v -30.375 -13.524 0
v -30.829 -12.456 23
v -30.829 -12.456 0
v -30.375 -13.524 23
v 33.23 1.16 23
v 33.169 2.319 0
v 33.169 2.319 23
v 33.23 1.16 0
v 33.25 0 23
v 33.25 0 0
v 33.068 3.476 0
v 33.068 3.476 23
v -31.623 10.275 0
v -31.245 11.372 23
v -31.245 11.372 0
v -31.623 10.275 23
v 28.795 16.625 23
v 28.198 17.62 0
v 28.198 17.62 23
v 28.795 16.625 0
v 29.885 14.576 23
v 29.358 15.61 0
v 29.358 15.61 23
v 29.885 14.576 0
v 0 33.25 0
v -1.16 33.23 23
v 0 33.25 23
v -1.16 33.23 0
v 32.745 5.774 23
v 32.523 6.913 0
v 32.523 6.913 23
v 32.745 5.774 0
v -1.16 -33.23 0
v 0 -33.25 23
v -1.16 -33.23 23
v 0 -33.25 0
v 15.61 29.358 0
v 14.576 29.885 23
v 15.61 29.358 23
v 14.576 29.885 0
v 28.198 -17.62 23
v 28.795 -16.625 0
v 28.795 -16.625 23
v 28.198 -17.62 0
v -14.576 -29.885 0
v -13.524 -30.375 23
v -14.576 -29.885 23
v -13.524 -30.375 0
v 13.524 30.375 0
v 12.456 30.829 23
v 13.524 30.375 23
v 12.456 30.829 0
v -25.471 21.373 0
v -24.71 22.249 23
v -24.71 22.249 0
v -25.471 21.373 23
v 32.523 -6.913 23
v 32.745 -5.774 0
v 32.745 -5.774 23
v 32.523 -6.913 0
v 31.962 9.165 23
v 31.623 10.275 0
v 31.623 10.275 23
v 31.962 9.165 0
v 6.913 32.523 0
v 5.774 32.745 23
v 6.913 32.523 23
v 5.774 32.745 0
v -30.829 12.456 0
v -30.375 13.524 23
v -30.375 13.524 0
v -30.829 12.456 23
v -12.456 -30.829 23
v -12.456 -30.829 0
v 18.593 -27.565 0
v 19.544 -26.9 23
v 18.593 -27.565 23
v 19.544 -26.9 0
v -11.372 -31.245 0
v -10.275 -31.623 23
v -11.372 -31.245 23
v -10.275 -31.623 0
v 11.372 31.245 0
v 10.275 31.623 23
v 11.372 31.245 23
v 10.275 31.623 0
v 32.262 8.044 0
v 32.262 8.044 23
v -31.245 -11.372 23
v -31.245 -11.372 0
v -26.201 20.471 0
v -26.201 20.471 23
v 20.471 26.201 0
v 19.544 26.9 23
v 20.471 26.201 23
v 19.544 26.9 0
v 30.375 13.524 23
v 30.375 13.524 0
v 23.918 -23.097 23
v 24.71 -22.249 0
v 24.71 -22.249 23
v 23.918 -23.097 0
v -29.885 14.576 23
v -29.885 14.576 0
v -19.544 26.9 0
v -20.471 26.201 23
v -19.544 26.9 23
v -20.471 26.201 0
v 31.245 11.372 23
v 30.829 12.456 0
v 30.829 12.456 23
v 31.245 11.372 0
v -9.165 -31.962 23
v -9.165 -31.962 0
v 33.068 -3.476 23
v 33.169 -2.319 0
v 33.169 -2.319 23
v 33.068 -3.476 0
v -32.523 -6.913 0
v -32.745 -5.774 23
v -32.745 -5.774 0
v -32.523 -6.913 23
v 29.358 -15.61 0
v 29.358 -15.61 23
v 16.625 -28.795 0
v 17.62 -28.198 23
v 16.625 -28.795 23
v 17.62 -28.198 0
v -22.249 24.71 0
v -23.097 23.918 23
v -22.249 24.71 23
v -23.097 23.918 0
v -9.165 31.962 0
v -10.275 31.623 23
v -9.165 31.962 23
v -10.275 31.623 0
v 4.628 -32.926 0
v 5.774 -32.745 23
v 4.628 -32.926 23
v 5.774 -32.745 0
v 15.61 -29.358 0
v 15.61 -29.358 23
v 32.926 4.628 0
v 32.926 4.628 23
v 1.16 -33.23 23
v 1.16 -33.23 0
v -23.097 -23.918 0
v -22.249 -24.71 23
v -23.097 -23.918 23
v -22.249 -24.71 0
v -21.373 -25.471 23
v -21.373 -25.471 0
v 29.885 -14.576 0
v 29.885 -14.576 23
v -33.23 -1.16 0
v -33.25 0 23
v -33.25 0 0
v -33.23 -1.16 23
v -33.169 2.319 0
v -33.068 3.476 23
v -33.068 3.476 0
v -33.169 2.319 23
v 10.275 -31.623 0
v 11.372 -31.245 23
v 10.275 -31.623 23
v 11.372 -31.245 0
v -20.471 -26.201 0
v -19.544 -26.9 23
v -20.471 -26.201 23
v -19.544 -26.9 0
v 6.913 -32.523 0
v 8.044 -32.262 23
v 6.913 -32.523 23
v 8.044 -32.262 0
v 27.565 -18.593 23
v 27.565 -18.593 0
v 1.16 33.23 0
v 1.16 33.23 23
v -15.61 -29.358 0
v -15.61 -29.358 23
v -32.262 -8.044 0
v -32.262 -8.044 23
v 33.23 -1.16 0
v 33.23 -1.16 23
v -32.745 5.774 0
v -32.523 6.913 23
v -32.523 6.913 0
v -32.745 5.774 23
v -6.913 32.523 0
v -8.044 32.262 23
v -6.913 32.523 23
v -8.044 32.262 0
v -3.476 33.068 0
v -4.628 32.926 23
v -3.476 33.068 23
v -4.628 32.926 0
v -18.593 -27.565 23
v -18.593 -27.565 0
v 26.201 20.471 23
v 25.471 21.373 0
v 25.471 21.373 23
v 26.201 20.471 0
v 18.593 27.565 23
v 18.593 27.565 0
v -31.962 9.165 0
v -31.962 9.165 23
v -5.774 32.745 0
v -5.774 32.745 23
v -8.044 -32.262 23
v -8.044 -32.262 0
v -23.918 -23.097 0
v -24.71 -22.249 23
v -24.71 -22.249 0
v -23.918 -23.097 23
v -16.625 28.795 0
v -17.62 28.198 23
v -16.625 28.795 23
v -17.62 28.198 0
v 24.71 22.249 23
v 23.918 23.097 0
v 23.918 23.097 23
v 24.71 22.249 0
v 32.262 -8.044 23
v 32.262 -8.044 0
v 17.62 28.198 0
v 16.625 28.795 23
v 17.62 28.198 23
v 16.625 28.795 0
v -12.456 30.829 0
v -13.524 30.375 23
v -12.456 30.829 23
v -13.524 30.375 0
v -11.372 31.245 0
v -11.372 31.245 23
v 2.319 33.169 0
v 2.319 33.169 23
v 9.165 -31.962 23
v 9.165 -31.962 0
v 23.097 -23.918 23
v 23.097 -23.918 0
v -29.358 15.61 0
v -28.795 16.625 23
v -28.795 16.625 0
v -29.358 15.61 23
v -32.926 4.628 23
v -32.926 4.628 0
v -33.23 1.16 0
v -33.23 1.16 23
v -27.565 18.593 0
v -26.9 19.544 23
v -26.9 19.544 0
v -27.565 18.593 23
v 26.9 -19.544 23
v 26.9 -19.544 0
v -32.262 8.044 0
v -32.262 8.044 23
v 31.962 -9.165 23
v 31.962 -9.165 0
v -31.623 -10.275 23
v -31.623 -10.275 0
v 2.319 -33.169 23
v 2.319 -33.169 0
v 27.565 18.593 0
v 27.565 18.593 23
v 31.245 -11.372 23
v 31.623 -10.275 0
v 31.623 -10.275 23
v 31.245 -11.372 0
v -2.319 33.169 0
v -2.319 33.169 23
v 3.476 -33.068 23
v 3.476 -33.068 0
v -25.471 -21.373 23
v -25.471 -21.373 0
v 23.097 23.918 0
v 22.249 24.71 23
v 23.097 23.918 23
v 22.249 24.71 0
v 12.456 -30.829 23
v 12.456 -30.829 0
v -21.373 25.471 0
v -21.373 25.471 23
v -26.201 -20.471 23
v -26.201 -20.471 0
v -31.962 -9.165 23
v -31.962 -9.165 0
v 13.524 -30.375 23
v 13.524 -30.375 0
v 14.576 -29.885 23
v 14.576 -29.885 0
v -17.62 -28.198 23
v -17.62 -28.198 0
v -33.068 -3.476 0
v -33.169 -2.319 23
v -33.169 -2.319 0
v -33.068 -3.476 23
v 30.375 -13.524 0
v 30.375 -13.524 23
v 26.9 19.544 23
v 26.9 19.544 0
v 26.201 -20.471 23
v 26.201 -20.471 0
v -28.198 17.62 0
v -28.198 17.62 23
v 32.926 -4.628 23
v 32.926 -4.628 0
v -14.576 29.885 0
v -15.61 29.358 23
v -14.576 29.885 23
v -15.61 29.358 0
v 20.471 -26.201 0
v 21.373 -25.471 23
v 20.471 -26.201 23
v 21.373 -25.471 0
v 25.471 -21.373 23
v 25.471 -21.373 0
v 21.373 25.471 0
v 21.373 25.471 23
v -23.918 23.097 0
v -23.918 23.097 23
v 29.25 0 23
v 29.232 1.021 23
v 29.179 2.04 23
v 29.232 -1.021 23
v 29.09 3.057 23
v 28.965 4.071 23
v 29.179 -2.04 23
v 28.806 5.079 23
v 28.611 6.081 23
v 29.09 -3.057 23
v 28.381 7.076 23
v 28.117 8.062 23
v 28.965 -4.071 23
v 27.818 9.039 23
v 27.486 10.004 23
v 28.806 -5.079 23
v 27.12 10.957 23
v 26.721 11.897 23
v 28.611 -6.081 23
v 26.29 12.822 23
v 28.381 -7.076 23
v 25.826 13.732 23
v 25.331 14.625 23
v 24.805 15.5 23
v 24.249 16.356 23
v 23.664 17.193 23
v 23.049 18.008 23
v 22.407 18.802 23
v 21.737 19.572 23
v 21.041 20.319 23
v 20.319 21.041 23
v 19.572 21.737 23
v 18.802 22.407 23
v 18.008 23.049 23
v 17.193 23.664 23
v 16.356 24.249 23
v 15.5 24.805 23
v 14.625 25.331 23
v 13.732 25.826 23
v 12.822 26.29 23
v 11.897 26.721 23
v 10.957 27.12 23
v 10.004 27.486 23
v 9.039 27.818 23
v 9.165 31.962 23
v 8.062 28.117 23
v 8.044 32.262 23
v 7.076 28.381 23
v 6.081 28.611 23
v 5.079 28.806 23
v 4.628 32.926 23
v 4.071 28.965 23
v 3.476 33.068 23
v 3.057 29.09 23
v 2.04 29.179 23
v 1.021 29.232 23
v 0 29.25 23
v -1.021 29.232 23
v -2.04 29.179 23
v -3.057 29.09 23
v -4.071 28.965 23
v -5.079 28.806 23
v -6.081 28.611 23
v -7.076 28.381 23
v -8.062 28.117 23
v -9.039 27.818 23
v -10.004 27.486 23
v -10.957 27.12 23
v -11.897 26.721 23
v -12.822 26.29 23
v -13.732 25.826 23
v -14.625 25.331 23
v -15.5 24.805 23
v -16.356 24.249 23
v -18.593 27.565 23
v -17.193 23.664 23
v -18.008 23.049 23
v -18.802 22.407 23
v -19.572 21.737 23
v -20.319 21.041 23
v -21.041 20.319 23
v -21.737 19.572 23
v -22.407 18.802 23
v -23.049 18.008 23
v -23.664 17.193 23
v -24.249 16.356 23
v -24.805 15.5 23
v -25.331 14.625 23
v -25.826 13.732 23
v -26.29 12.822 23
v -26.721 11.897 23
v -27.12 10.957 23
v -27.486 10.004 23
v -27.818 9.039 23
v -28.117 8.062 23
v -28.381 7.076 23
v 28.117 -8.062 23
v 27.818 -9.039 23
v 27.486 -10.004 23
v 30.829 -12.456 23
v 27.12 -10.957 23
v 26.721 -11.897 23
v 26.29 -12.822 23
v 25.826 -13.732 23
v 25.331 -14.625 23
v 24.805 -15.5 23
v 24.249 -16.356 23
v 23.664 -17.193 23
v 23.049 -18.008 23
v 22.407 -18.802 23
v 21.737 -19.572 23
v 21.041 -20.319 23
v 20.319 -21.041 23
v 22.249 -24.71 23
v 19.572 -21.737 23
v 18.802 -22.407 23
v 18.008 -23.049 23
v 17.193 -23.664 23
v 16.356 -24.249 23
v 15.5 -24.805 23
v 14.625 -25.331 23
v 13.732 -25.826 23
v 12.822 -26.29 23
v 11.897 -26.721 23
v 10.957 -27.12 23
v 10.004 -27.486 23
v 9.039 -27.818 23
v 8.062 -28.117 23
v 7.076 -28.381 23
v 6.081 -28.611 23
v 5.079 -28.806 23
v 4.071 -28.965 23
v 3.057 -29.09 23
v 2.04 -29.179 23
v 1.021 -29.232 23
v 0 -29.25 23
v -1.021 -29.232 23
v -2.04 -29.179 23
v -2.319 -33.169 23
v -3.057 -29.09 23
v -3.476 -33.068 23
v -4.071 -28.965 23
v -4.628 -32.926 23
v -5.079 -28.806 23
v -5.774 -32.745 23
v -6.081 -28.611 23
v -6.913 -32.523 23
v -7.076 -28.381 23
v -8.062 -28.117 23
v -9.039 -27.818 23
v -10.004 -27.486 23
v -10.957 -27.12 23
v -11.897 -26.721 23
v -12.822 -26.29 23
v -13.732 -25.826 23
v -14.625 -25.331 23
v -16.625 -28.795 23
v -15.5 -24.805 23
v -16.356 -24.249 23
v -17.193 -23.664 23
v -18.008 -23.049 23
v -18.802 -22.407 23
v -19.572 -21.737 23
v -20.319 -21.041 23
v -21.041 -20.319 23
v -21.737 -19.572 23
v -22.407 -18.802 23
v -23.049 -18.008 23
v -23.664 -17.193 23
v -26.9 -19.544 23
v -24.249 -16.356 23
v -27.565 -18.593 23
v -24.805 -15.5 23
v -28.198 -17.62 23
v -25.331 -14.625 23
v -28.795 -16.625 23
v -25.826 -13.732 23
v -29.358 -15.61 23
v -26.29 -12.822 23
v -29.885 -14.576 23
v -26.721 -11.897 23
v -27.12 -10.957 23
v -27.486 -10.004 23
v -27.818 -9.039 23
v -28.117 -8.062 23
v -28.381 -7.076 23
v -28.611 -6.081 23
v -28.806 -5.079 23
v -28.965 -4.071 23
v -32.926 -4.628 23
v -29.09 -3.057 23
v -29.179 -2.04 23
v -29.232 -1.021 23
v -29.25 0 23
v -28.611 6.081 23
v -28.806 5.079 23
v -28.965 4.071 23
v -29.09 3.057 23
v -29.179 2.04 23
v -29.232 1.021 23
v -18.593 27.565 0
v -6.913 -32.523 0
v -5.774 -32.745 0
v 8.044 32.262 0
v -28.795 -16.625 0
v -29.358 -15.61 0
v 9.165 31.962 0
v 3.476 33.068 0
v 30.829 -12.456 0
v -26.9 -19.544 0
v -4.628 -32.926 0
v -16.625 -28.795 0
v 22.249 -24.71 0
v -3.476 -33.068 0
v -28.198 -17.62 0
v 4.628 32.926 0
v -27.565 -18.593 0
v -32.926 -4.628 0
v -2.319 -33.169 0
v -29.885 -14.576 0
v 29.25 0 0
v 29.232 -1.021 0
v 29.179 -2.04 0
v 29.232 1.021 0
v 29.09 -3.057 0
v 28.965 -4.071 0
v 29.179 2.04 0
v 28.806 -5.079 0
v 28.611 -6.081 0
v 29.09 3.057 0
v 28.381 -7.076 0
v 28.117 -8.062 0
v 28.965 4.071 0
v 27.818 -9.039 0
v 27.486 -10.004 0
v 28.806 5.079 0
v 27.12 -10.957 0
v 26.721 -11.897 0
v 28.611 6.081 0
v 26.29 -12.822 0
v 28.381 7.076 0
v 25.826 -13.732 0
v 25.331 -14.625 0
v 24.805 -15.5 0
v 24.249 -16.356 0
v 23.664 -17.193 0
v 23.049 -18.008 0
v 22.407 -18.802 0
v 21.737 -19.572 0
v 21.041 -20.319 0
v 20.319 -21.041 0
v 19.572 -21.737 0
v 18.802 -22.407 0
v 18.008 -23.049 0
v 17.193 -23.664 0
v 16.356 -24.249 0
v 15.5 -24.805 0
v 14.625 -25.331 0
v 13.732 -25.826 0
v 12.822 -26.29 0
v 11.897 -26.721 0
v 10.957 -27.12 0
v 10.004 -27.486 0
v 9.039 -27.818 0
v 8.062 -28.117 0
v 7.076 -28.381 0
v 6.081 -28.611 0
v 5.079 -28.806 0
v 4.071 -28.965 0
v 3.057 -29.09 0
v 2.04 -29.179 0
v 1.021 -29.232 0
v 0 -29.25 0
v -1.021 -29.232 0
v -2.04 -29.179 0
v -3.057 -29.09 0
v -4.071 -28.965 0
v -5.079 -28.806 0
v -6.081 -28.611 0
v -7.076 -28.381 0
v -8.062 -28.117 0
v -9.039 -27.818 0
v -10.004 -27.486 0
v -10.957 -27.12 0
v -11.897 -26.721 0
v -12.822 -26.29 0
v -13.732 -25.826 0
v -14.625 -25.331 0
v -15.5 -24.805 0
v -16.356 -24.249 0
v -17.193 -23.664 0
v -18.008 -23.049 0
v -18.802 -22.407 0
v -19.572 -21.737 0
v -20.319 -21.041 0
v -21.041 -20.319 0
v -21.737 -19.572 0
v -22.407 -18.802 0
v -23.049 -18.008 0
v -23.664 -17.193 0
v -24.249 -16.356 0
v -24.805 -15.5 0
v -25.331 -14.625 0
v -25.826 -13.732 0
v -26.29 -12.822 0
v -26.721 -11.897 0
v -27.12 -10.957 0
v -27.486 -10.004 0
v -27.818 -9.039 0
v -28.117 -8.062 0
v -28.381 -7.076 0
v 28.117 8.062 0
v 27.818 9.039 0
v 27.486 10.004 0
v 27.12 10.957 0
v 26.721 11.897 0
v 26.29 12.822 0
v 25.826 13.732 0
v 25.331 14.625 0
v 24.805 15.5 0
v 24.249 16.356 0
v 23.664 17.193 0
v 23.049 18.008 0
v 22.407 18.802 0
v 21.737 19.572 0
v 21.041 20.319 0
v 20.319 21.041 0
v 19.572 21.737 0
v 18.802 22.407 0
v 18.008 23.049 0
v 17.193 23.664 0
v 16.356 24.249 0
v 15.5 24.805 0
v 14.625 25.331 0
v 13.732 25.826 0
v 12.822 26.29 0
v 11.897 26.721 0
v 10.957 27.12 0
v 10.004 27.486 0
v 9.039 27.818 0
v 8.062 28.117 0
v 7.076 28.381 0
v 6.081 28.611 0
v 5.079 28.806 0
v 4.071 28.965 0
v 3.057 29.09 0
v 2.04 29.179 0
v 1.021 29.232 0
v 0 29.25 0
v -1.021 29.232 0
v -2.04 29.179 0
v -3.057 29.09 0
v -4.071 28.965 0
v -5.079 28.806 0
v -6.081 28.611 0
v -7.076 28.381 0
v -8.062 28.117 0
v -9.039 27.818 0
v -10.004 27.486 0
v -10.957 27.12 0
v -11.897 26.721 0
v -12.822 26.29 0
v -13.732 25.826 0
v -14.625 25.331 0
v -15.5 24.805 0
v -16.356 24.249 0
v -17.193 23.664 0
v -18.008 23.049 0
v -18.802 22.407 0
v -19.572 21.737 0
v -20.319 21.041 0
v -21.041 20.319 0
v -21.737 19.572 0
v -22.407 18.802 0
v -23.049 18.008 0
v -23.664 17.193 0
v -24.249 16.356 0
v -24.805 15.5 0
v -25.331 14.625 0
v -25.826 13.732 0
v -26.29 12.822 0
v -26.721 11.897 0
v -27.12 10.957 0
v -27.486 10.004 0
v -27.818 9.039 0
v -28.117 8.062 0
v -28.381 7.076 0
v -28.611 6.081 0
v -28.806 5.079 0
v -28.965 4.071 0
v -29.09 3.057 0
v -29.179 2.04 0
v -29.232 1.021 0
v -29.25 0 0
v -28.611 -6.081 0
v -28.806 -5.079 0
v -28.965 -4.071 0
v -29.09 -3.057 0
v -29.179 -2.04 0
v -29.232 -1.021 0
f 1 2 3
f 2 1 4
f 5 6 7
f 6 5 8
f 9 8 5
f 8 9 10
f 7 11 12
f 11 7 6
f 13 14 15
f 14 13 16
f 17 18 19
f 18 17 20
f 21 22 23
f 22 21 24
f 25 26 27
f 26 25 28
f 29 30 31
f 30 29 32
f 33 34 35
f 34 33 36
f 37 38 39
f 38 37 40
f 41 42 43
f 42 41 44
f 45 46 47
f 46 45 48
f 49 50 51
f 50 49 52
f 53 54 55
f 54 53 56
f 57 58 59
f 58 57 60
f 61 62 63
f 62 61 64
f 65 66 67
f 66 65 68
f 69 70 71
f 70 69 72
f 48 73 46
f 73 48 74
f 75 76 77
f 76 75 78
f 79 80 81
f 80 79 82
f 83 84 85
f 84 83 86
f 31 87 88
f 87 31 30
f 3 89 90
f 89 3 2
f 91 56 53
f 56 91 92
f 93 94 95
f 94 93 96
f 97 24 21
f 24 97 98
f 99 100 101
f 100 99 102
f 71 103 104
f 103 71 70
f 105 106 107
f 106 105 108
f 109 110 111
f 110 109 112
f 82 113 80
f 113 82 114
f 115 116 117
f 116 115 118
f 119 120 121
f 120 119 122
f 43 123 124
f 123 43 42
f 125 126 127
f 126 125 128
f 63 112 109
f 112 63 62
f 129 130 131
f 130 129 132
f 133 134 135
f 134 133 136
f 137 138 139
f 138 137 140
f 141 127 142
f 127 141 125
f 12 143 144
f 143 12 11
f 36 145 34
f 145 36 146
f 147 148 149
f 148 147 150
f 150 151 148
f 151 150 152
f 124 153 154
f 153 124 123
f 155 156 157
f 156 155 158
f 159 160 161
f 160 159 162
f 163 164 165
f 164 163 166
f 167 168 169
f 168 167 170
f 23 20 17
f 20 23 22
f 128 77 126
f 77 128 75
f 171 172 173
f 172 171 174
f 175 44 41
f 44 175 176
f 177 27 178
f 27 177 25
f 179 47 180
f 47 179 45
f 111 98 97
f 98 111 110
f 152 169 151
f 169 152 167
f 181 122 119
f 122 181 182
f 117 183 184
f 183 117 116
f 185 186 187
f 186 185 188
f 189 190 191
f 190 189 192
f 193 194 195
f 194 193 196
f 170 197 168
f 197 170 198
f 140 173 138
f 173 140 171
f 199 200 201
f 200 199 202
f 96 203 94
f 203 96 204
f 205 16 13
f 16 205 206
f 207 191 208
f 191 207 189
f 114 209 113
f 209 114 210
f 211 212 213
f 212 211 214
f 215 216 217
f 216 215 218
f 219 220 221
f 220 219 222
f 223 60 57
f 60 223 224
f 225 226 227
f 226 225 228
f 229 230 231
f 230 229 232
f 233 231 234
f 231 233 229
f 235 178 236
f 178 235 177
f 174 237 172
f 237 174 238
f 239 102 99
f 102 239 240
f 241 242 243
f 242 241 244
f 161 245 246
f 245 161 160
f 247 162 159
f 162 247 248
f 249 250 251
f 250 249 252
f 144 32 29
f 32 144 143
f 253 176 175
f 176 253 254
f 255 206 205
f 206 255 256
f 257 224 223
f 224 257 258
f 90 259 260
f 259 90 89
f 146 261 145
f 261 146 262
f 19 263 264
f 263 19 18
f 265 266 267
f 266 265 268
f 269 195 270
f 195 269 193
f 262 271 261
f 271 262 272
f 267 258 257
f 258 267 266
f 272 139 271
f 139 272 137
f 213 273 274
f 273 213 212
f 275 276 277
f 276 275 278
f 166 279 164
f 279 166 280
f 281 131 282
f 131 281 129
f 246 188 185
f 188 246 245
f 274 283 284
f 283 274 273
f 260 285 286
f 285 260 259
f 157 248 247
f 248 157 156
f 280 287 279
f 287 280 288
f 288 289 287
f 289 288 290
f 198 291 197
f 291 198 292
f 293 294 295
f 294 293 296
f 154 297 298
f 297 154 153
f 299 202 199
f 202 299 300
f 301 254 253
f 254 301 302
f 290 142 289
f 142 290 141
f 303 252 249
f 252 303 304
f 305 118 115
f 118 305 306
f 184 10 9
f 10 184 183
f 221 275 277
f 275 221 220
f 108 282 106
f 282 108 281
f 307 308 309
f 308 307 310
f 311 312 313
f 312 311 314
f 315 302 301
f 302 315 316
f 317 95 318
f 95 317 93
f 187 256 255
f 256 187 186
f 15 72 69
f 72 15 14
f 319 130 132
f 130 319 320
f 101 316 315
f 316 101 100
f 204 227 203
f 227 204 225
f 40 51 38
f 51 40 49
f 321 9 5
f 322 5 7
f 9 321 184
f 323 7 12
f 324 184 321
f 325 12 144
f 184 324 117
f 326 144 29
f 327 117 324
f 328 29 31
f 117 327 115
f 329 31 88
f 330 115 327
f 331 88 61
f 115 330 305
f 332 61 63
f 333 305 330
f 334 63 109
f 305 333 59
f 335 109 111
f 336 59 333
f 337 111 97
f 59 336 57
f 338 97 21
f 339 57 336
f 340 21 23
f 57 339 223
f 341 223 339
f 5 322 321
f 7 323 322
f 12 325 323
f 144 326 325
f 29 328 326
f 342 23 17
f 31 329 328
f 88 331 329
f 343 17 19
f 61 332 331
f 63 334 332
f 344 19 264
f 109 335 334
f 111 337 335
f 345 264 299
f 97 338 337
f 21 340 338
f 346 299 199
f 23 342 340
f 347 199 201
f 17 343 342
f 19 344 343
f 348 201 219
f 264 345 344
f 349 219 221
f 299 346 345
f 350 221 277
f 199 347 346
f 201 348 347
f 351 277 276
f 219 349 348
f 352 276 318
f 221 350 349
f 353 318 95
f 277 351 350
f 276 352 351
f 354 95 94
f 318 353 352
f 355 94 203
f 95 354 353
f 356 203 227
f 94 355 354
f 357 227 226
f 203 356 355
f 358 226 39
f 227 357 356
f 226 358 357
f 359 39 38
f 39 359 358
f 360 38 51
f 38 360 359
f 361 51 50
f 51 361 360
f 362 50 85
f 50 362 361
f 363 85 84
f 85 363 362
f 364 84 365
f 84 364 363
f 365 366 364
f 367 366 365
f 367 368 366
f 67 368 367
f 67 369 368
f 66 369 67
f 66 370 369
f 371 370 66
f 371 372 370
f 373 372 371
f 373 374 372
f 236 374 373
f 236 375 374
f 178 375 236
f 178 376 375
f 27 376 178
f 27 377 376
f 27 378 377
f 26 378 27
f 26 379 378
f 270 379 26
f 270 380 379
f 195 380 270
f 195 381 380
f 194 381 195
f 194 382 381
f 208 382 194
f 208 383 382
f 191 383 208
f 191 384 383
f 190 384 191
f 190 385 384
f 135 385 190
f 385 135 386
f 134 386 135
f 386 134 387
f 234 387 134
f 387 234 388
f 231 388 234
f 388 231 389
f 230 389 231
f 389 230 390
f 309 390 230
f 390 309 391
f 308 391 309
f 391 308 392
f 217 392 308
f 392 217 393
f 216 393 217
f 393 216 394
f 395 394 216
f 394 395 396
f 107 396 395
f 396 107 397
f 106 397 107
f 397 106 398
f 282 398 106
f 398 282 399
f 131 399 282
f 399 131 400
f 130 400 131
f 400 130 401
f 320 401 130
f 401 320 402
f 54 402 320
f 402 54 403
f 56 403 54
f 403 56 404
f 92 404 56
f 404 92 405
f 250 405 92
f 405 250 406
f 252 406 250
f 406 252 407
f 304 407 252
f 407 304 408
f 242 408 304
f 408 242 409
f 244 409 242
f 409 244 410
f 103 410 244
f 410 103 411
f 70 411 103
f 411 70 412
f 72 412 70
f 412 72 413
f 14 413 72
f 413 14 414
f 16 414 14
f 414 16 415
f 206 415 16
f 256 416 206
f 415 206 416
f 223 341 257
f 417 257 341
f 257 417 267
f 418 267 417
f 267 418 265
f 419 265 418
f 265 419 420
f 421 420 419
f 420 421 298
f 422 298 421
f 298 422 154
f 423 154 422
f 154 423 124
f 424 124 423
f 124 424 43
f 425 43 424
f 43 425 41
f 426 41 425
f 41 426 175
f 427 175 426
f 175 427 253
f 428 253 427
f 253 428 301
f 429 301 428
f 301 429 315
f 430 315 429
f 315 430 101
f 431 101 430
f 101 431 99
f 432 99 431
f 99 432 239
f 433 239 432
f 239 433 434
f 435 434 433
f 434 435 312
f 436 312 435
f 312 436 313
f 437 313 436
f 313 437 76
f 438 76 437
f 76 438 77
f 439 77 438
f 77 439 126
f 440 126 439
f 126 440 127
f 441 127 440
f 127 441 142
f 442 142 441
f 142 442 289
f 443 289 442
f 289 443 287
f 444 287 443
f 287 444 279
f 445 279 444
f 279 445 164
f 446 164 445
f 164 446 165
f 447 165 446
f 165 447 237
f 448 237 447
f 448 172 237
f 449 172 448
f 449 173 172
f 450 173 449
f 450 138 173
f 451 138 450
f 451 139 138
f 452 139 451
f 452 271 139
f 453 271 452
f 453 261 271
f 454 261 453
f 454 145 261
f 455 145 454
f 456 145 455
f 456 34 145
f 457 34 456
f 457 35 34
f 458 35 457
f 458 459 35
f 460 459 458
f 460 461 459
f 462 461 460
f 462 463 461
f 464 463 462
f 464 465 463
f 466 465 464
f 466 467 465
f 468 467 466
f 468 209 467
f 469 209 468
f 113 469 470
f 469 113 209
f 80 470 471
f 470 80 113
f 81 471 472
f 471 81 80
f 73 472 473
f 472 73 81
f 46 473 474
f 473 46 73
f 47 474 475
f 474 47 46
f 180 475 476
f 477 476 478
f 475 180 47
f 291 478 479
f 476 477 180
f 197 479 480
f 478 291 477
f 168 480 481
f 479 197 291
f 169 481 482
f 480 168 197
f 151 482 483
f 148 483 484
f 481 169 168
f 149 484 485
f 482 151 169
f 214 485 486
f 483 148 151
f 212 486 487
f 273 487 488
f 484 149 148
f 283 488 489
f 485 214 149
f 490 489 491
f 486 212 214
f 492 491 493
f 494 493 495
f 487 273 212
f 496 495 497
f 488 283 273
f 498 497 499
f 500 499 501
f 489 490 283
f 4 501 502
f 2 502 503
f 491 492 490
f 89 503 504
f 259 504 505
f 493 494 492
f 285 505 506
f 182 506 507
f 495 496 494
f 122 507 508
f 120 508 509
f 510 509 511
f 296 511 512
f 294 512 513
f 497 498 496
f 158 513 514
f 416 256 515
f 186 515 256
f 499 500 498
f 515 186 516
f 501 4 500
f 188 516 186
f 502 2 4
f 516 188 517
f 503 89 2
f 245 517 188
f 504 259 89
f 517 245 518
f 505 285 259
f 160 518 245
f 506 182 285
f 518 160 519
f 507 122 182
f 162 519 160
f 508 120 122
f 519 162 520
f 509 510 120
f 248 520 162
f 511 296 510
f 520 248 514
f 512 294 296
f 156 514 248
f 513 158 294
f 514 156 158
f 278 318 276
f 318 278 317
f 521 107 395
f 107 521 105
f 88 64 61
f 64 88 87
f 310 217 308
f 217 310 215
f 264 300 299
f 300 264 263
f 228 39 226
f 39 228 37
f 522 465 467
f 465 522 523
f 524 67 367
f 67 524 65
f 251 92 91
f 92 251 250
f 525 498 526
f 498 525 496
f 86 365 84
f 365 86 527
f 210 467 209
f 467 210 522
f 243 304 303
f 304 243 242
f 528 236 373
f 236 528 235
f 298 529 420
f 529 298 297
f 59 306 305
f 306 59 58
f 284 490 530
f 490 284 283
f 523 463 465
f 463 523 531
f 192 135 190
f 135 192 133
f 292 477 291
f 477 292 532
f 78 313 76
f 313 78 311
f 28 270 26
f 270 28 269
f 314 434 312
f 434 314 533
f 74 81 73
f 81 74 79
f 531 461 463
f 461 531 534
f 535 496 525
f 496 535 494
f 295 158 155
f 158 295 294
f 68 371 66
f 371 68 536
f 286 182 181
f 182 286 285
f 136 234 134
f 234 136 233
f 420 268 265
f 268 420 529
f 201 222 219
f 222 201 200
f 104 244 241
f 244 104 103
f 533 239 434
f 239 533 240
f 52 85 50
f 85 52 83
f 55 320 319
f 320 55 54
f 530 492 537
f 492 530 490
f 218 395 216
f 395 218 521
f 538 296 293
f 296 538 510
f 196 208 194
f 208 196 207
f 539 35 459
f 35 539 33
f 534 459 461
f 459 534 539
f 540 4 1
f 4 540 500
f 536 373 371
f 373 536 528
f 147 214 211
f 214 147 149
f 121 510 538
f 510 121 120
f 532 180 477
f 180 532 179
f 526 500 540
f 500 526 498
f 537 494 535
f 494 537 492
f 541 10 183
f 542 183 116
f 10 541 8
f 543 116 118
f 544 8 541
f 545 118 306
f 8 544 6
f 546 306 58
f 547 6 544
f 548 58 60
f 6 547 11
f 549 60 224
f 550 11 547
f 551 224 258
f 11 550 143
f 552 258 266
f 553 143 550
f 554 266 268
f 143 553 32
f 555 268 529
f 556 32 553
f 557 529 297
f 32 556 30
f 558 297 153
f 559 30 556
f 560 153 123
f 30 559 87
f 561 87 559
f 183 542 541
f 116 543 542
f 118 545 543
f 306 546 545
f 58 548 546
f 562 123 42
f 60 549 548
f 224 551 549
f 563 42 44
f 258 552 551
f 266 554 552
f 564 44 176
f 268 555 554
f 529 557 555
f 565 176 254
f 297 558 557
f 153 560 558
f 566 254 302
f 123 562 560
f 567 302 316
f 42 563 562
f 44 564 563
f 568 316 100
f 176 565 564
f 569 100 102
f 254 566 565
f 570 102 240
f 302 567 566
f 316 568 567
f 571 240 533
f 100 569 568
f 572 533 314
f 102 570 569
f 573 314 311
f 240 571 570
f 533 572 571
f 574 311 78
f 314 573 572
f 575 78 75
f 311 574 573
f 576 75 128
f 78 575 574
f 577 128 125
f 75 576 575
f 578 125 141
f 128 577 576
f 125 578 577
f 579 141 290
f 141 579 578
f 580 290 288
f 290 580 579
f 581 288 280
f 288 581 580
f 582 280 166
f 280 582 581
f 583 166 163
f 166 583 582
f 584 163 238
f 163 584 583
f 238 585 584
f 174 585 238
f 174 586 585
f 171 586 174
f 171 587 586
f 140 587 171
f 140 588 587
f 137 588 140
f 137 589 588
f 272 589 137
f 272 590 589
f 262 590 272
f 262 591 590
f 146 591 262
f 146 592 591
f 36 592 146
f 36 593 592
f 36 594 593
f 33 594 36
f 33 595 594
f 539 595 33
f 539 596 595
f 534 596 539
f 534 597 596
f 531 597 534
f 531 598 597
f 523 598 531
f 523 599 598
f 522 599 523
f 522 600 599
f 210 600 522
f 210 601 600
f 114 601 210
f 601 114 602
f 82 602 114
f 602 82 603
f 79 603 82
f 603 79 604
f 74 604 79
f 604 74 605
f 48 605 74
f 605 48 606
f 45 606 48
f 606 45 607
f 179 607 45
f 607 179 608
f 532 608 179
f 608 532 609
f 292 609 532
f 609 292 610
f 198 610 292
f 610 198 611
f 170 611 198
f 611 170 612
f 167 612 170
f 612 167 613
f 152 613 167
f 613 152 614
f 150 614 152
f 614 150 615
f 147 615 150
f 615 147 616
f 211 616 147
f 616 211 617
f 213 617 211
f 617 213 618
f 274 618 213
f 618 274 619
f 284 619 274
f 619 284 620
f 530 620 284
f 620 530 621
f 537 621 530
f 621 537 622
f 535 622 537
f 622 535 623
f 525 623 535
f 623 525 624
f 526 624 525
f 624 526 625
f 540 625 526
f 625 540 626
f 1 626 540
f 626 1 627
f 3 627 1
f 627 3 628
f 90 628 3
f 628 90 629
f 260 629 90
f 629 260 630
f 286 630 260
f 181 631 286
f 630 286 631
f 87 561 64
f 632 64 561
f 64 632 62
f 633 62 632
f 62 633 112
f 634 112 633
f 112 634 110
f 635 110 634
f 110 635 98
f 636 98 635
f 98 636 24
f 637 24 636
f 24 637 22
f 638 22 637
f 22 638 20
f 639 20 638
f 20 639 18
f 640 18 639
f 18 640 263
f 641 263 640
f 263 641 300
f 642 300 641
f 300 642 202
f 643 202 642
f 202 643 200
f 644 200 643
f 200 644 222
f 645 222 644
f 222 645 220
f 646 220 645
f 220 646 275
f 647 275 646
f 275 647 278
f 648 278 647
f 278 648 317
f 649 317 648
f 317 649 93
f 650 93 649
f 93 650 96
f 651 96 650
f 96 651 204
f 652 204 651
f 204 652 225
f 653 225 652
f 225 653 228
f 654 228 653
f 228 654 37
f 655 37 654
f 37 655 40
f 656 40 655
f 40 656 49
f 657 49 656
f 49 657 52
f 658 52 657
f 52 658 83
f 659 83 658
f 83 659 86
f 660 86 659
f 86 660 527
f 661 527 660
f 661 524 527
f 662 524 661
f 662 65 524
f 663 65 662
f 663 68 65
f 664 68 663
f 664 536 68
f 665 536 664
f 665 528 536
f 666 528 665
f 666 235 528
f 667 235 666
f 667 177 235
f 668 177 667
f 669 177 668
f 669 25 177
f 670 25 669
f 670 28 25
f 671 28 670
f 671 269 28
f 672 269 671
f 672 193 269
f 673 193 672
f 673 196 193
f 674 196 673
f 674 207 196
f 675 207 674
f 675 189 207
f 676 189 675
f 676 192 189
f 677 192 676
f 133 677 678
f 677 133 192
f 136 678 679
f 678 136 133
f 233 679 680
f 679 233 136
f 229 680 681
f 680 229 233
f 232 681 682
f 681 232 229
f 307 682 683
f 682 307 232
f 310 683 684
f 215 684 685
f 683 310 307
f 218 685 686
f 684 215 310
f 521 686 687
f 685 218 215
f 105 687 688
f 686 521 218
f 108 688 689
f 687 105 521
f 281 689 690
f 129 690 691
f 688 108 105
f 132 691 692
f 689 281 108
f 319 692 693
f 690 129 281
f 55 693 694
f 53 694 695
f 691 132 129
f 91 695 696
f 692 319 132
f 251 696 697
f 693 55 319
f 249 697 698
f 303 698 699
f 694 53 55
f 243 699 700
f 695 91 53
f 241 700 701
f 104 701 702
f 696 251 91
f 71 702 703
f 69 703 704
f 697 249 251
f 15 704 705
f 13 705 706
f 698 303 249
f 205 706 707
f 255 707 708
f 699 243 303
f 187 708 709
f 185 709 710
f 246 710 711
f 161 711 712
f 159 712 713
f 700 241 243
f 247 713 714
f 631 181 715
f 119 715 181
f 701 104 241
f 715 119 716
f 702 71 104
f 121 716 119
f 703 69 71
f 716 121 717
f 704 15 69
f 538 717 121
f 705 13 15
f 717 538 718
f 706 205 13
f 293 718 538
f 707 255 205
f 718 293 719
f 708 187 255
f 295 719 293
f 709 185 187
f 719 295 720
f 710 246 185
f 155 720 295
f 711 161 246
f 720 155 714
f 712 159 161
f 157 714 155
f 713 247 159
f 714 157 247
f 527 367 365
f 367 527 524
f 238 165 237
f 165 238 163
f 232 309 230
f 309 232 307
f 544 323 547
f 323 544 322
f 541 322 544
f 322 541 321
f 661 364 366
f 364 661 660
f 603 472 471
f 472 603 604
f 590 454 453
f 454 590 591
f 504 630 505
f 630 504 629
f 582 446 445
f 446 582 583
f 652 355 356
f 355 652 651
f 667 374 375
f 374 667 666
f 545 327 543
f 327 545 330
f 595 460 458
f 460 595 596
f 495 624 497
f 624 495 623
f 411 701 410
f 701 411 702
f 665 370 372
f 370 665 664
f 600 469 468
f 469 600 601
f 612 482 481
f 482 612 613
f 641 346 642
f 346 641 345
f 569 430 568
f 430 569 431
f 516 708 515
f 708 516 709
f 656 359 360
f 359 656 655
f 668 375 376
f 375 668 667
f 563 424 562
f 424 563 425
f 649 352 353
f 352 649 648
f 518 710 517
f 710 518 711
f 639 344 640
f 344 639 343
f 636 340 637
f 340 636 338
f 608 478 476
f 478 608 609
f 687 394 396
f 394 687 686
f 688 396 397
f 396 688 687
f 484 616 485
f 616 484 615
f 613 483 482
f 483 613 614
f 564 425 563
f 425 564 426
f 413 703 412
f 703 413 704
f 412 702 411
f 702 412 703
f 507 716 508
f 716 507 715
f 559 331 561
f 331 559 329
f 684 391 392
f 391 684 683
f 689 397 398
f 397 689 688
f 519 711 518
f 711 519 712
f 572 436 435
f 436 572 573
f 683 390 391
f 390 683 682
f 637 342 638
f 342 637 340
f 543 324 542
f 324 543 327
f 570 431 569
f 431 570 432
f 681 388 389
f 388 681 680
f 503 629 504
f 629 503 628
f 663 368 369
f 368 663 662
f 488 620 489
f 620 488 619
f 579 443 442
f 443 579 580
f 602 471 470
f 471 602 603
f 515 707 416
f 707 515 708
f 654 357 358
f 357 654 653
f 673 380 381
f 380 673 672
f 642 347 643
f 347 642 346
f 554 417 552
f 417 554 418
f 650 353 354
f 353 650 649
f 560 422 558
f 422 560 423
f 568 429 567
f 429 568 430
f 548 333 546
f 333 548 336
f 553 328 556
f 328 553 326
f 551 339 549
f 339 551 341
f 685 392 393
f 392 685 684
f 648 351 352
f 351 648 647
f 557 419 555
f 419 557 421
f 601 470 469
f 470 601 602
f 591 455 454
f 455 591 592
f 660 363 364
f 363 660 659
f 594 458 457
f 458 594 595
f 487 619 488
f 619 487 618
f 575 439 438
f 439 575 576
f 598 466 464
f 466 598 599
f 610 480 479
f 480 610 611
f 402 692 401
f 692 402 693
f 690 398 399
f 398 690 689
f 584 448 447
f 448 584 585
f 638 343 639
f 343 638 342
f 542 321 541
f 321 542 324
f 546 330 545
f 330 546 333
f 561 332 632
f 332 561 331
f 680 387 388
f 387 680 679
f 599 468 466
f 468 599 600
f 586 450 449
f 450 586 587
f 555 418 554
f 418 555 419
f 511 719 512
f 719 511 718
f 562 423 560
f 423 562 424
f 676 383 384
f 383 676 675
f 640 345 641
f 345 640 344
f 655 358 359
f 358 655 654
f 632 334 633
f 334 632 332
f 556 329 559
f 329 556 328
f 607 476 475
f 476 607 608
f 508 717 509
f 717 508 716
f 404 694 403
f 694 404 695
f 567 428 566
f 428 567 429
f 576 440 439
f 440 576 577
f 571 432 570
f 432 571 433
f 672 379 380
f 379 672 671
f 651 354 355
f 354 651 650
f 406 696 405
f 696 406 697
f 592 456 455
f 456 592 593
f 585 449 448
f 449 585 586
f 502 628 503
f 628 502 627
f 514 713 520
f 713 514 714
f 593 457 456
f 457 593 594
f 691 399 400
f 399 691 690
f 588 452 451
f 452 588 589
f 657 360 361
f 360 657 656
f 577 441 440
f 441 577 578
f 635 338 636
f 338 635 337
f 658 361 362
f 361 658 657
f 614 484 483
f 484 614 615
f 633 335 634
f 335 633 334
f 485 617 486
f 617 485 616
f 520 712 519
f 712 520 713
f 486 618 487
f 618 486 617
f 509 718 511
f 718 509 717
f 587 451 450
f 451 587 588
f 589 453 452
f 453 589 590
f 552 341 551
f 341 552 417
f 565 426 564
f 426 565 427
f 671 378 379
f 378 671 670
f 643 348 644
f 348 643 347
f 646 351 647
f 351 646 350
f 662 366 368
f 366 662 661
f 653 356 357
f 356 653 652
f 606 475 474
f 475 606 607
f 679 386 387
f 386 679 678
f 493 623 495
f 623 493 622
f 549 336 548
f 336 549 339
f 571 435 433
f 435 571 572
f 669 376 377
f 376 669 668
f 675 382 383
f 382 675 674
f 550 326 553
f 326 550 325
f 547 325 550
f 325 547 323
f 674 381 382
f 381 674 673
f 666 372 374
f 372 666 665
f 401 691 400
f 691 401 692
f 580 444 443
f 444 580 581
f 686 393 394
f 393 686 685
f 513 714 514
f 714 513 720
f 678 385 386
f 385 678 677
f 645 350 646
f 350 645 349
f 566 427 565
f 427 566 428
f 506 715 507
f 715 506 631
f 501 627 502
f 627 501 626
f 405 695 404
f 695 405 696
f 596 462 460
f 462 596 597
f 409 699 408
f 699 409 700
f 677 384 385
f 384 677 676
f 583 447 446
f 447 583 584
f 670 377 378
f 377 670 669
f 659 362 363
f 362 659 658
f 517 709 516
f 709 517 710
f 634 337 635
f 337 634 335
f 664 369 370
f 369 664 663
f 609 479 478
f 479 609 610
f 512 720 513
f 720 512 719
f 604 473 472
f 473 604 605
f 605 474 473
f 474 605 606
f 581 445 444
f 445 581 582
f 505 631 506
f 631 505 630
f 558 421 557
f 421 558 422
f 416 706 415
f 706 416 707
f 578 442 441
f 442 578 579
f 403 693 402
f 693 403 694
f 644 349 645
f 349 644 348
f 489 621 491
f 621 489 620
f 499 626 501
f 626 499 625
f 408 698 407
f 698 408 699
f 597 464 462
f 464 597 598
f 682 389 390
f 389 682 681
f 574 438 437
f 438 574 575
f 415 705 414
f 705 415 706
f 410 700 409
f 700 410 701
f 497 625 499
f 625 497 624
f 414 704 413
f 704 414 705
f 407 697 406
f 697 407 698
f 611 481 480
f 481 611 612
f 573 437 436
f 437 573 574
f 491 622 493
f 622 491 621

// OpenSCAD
module ring (ro = 66.5/2, w = 4, h = 23)
{
    difference () {
        cylinder (h = h, r = ro);
        translate ([0, 0, -h])
            cylinder (h = 3 * h, r = ro - w);
    }
}

ring ($fa = 2, $fs = .5);
